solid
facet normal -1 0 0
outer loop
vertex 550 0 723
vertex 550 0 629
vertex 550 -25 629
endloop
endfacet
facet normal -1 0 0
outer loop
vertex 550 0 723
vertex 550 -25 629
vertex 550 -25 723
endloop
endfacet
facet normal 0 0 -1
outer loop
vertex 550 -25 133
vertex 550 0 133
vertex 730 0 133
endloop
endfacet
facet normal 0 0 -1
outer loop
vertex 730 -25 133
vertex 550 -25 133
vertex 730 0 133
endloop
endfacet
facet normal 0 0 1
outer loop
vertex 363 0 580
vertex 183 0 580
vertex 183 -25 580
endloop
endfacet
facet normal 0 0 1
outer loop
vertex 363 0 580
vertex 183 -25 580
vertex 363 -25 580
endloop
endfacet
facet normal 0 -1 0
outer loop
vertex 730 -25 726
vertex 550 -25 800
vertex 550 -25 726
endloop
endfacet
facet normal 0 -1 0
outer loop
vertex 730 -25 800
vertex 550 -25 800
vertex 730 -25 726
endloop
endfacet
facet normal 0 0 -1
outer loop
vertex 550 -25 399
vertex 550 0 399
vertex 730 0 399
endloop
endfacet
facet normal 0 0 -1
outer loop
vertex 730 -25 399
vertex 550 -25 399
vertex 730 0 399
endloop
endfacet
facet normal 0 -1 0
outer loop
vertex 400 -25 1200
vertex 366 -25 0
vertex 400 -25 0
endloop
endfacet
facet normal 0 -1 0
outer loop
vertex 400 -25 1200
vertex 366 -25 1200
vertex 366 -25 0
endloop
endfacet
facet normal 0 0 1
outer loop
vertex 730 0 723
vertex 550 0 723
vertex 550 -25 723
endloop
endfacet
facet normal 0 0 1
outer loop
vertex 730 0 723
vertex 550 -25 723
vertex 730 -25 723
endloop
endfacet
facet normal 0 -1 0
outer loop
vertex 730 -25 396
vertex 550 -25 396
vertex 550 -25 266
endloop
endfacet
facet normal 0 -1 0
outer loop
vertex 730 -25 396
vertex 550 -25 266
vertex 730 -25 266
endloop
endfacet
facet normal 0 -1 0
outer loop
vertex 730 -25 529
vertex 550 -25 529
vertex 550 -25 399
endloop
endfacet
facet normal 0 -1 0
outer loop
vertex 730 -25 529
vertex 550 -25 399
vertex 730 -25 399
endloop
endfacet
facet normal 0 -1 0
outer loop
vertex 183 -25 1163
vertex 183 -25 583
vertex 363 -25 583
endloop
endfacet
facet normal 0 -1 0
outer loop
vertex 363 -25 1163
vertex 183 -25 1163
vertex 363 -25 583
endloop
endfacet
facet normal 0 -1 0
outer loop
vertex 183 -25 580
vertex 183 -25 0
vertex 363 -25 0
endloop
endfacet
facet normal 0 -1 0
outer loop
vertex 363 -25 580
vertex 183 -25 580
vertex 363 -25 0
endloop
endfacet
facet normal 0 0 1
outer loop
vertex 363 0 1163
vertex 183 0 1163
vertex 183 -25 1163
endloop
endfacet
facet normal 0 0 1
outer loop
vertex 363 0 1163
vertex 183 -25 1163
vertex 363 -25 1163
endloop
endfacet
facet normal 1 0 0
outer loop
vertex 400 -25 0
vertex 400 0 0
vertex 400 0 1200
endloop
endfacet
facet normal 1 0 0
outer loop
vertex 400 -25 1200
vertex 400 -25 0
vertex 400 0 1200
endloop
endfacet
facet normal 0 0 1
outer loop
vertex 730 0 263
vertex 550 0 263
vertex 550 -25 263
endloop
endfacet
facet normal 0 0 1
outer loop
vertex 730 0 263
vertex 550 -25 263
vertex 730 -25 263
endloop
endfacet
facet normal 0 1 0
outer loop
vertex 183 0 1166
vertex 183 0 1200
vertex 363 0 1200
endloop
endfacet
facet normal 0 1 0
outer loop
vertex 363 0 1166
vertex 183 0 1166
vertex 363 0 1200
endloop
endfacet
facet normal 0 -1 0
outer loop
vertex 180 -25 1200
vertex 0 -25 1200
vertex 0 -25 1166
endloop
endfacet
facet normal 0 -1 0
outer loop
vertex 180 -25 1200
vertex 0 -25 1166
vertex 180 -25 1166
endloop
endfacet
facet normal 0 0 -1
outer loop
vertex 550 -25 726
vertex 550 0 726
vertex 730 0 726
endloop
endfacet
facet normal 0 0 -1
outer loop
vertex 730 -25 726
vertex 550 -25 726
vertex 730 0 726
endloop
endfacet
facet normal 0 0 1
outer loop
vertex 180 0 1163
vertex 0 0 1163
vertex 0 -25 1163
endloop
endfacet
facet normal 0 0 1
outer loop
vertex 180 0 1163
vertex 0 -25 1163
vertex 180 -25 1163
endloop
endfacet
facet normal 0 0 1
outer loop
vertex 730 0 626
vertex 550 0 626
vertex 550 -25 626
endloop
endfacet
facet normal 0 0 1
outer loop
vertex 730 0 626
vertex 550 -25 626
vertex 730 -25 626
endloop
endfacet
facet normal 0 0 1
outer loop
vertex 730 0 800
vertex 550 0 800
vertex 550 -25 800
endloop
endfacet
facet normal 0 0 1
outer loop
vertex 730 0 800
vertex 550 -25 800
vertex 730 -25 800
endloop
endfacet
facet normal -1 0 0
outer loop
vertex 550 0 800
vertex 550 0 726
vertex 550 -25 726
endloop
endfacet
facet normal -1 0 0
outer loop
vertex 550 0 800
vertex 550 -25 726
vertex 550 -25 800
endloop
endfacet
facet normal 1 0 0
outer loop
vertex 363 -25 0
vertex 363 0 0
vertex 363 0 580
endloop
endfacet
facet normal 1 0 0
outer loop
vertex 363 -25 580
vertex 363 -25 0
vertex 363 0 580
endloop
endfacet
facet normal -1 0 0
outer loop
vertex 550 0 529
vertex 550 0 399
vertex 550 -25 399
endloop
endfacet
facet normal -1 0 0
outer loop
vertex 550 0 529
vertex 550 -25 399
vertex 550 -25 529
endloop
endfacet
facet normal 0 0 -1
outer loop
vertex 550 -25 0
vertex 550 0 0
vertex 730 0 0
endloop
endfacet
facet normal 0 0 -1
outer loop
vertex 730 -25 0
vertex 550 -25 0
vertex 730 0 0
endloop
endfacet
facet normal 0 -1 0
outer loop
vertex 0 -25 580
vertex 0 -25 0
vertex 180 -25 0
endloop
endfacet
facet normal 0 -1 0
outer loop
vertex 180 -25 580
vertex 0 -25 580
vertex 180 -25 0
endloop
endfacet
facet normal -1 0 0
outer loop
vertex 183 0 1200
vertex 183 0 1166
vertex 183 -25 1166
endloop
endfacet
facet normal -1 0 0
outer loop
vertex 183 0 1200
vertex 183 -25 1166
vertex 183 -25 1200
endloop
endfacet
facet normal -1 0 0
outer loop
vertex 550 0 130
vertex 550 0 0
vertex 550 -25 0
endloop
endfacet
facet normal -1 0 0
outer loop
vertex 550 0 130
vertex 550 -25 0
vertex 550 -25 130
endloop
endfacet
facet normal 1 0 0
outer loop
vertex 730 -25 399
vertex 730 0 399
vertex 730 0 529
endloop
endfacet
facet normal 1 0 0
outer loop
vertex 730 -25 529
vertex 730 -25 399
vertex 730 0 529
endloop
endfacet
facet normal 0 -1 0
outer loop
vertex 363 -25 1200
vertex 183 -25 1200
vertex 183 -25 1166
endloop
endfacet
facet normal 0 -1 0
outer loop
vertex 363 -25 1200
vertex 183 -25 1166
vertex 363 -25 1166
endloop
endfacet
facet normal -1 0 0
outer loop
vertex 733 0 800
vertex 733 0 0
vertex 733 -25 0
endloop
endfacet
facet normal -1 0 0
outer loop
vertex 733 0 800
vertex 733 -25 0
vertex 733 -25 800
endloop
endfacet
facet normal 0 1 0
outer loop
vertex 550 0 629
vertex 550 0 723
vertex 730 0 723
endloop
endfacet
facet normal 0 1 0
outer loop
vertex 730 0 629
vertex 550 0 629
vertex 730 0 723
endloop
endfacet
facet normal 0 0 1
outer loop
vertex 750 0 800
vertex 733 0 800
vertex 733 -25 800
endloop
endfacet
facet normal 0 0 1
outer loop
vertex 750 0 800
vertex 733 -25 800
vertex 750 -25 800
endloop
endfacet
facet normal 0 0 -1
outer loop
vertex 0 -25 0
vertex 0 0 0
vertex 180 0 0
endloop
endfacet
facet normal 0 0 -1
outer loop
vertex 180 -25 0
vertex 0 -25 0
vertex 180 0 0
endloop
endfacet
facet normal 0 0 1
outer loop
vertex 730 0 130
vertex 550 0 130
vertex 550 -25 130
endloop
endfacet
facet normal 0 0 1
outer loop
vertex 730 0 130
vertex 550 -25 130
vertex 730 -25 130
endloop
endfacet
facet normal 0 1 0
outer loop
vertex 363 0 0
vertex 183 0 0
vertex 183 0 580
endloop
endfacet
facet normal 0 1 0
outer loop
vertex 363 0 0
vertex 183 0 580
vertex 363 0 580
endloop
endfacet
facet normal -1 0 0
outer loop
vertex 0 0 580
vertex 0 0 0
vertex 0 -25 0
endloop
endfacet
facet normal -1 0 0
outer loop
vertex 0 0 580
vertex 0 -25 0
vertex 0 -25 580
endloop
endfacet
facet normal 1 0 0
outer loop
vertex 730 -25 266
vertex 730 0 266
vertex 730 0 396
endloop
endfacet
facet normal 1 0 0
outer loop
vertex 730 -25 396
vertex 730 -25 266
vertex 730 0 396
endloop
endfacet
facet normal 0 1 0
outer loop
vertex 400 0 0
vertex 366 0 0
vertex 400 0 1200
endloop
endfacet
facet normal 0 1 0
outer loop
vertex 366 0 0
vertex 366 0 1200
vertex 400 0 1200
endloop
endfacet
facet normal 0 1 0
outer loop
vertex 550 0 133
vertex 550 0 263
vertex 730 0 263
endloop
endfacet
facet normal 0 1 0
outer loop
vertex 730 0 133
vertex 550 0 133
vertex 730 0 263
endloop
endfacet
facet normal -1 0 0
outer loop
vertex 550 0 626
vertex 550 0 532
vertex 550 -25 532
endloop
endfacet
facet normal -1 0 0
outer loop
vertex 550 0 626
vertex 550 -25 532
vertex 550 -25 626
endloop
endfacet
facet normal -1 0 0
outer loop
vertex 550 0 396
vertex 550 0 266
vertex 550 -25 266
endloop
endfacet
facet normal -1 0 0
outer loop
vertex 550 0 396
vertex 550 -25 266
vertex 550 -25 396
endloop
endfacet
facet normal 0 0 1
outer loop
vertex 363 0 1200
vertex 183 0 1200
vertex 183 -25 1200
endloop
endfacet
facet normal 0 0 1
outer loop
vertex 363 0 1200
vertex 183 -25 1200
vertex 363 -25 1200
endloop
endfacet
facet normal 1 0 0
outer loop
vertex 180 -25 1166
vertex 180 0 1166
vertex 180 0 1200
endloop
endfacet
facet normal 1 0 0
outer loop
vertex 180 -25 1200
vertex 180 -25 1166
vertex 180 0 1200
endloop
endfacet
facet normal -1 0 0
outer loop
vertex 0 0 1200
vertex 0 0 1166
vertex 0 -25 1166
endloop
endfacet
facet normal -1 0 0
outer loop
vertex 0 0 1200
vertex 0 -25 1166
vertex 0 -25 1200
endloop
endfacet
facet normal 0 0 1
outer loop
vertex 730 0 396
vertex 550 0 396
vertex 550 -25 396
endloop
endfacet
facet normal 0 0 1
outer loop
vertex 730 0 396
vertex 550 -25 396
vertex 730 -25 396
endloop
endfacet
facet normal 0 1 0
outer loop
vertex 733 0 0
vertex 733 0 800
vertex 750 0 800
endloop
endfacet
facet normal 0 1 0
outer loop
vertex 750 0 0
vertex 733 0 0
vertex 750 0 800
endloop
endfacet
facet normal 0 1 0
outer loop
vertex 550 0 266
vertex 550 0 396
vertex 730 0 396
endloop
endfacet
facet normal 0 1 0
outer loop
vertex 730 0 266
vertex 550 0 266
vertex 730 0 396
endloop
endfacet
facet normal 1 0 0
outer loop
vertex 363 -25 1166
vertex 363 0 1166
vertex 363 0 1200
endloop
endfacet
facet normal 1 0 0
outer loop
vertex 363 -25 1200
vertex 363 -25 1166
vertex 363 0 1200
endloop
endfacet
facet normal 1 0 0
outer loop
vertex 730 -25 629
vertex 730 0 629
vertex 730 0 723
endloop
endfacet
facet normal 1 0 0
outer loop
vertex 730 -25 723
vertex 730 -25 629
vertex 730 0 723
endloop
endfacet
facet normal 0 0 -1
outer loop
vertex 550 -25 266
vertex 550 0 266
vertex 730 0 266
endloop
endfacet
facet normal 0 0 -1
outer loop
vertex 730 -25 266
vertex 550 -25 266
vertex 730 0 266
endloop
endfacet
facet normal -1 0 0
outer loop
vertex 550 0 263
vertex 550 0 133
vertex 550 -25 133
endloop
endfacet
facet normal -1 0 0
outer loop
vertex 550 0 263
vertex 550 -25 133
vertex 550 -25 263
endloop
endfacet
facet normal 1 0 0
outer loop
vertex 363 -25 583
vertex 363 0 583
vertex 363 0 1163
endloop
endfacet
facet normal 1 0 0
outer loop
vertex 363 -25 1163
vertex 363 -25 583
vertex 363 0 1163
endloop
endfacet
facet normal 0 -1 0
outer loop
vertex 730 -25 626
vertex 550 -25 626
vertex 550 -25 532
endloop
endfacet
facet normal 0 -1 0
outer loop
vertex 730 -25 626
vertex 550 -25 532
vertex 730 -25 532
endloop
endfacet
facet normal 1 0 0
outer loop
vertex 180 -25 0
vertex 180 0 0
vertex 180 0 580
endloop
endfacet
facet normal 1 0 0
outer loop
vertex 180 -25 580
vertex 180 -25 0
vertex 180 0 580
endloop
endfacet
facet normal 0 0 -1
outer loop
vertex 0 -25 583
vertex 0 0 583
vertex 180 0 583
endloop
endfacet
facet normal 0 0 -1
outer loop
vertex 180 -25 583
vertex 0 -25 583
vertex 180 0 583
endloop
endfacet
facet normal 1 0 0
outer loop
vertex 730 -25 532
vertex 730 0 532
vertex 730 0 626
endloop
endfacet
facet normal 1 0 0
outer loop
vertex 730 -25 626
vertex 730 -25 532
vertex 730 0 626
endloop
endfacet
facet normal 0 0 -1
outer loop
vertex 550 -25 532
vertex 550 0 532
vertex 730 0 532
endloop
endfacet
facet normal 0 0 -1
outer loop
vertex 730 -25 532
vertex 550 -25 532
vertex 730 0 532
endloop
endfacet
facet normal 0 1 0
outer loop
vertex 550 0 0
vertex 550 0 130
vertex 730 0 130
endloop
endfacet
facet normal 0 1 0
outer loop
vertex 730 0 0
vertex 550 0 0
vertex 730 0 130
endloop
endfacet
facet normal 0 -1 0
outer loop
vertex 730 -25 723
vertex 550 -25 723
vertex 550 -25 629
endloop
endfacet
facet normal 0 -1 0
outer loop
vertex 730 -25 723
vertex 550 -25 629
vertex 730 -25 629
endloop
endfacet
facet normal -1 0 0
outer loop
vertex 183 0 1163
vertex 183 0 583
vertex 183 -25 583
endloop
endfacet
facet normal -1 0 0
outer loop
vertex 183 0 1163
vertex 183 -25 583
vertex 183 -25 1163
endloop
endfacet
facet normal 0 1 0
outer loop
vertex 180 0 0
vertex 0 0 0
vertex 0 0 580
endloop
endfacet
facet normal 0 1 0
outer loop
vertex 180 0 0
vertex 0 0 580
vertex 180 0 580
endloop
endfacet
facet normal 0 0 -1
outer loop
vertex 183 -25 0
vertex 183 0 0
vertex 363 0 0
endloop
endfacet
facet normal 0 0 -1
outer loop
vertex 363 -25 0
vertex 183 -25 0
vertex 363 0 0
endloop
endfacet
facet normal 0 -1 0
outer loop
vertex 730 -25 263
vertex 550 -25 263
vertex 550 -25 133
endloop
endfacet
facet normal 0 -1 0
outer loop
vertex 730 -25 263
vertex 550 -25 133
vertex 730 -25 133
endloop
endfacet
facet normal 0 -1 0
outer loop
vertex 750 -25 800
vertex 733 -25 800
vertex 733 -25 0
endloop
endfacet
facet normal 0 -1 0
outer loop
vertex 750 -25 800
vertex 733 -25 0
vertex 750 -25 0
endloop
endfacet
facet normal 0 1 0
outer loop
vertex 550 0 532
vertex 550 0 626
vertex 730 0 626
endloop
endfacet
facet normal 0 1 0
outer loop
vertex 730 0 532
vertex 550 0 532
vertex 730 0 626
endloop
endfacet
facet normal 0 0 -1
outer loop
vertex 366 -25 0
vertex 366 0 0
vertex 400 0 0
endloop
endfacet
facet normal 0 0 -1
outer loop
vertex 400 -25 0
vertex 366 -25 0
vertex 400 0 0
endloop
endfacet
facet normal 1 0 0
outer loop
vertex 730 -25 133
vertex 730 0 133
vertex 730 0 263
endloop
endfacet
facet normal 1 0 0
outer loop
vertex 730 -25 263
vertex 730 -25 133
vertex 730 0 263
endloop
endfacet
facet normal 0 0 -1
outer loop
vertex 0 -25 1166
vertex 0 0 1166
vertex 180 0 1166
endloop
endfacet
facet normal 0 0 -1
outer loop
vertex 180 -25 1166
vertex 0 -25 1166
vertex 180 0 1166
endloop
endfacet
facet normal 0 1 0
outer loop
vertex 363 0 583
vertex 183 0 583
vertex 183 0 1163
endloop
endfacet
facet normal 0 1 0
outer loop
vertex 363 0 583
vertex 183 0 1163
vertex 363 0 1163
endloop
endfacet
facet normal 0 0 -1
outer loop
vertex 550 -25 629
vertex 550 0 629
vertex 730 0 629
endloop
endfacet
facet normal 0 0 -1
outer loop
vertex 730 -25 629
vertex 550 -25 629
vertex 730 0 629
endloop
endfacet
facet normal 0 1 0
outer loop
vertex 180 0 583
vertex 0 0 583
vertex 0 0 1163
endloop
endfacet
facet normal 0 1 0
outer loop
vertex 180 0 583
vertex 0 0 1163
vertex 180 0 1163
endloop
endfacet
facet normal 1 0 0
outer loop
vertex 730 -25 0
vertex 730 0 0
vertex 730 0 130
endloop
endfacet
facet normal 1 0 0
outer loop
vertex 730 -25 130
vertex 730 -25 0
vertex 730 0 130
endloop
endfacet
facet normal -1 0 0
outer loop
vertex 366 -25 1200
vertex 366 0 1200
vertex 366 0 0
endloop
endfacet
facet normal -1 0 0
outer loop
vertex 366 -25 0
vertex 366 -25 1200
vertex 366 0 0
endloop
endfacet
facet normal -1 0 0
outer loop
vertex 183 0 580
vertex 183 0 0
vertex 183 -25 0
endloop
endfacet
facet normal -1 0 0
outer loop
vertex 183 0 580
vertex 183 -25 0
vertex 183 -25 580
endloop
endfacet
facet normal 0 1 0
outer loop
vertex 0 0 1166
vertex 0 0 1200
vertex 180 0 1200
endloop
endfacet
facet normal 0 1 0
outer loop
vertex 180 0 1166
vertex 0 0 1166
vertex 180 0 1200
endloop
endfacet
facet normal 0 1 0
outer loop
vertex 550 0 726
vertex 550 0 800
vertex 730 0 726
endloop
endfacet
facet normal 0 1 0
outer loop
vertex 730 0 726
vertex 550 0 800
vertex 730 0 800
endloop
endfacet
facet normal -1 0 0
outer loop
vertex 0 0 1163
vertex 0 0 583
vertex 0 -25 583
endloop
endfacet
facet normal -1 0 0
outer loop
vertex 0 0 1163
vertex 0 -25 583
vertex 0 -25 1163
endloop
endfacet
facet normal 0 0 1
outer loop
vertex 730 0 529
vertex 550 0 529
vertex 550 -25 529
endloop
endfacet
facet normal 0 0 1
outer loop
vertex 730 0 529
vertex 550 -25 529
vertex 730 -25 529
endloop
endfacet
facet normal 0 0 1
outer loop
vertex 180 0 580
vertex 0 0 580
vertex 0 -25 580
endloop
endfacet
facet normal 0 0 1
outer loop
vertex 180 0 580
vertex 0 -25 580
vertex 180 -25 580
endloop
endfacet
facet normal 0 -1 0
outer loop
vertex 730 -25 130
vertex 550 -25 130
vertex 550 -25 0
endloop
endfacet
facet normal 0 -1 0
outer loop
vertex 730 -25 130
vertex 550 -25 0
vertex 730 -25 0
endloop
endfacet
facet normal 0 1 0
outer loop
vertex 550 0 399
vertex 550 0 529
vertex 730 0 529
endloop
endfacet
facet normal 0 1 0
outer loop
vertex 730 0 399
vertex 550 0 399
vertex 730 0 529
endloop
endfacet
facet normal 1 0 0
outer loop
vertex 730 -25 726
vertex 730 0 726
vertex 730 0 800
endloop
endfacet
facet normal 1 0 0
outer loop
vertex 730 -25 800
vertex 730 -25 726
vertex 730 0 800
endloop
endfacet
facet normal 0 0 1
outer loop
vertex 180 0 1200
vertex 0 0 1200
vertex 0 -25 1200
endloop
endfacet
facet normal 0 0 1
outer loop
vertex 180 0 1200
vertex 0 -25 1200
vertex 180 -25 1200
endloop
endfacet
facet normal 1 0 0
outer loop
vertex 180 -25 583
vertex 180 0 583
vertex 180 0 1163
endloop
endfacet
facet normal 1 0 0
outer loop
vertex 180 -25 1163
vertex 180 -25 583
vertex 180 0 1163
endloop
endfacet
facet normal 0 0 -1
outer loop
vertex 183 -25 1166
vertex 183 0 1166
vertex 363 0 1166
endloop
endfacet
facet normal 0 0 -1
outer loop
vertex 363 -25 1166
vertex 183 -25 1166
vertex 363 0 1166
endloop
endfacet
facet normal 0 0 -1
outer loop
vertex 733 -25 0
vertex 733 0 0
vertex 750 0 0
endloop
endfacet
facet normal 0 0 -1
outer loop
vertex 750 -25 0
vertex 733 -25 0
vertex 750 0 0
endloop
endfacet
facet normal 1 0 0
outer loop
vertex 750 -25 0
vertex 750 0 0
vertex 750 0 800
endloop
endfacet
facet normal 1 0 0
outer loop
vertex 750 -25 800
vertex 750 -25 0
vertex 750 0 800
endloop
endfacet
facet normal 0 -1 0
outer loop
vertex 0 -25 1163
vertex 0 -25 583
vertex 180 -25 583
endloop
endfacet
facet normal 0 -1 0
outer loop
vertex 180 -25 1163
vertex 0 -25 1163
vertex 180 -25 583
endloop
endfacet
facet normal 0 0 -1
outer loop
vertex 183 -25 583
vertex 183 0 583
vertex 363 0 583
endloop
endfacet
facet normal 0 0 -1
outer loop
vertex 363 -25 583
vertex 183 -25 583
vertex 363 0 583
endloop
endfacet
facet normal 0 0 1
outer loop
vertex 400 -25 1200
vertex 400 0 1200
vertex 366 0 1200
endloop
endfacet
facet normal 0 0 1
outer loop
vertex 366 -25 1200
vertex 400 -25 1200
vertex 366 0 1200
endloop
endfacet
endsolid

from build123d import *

# Parameters (mm, degrees)
F0_W     = 180
F0_H     = 580
F1_DEPTH = 25
F0_H_2   = 34
F2_W     = 180
F2_H     = 130
F3_DEPTH = 25
F2_H_2   = 94
F2_H_3   = 74
F2_W_2   = 17
F2_H_4   = 800


with BuildPart() as f1:
    # F0 (on Front) → F1 (new body)
    with BuildSketch(Plane.XZ):
        with Locations((90, 873)):
            Rectangle(F0_W, F0_H)
    extrude(amount=F1_DEPTH)


with BuildPart() as f1b:
    # F0 (on Front) → F1, piece 2 (new body)
    with BuildSketch(Plane.XZ):
        with Locations((273, 873)):
            Rectangle(F0_W, F0_H)
    extrude(amount=F1_DEPTH)


with BuildPart() as f1c:
    # F0 (on Front) → F1, piece 3 (new body)
    with BuildSketch(Plane.XZ):
        with Locations((90, 290)):
            Rectangle(F0_W, F0_H)
    extrude(amount=F1_DEPTH)


with BuildPart() as f1d:
    # F0 (on Front) → F1, piece 4 (new body)
    with BuildSketch(Plane.XZ):
        with Locations((273, 290)):
            Rectangle(F0_W, F0_H)
    extrude(amount=F1_DEPTH)


with BuildPart() as f1e:
    # F0 (on Front) → F1, piece 5 (new body)
    with BuildSketch(Plane.XZ):
        with Locations((90, 1183)):
            Rectangle(F0_W, F0_H_2)
    extrude(amount=F1_DEPTH)


with BuildPart() as f1f:
    # F0 (on Front) → F1, piece 6 (new body)
    with BuildSketch(Plane.XZ):
        with Locations((273, 1183)):
            Rectangle(F0_W, F0_H_2)
    extrude(amount=F1_DEPTH)


with BuildPart() as f1g:
    # F0 (on Front) → F1, piece 7 (new body)
    with BuildSketch(Plane.XZ):
        Polygon((366, 580), (366, 0), (400, 0), (400, 1200), (366, 1200), (366, 1166), (366, 1163), (366, 583), align=None)
    extrude(amount=F1_DEPTH)


with BuildPart() as f3:
    # F2 (on Front) → F3 (new body)
    with BuildSketch(Plane.XZ):
        with Locations((640, 65)):
            Rectangle(F2_W, F2_H)
    extrude(amount=F3_DEPTH)


with BuildPart() as f3b:
    # F2 (on Front) → F3, piece 2 (new body)
    with BuildSketch(Plane.XZ):
        with Locations((640, 198)):
            Rectangle(F2_W, F2_H)
    extrude(amount=F3_DEPTH)


with BuildPart() as f3c:
    # F2 (on Front) → F3, piece 3 (new body)
    with BuildSketch(Plane.XZ):
        with Locations((640, 331)):
            Rectangle(F2_W, F2_H)
    extrude(amount=F3_DEPTH)


with BuildPart() as f3d:
    # F2 (on Front) → F3, piece 4 (new body)
    with BuildSketch(Plane.XZ):
        with Locations((640, 464)):
            Rectangle(F2_W, F2_H)
    extrude(amount=F3_DEPTH)


with BuildPart() as f3e:
    # F2 (on Front) → F3, piece 5 (new body)
    with BuildSketch(Plane.XZ):
        with Locations((640, 579)):
            Rectangle(F2_W, F2_H_2)
    extrude(amount=F3_DEPTH)


with BuildPart() as f3f:
    # F2 (on Front) → F3, piece 6 (new body)
    with BuildSketch(Plane.XZ):
        with Locations((640, 676)):
            Rectangle(F2_W, F2_H_2)
    extrude(amount=F3_DEPTH)


with BuildPart() as f3g:
    # F2 (on Front) → F3, piece 7 (new body)
    with BuildSketch(Plane.XZ):
        with Locations((640, 763)):
            Rectangle(F2_W, F2_H_3)
    extrude(amount=F3_DEPTH)


with BuildPart() as f3h:
    # F2 (on Front) → F3, piece 8 (new body)
    with BuildSketch(Plane.XZ):
        with Locations((741.5, 400)):
            Rectangle(F2_W_2, F2_H_4)
    extrude(amount=F3_DEPTH)


solid = Compound([f1.part, f1b.part, f1c.part, f1d.part, f1e.part, f1f.part, f1g.part, f3.part, f3b.part, f3c.part, f3d.part, f3e.part, f3f.part, f3g.part, f3h.part])
